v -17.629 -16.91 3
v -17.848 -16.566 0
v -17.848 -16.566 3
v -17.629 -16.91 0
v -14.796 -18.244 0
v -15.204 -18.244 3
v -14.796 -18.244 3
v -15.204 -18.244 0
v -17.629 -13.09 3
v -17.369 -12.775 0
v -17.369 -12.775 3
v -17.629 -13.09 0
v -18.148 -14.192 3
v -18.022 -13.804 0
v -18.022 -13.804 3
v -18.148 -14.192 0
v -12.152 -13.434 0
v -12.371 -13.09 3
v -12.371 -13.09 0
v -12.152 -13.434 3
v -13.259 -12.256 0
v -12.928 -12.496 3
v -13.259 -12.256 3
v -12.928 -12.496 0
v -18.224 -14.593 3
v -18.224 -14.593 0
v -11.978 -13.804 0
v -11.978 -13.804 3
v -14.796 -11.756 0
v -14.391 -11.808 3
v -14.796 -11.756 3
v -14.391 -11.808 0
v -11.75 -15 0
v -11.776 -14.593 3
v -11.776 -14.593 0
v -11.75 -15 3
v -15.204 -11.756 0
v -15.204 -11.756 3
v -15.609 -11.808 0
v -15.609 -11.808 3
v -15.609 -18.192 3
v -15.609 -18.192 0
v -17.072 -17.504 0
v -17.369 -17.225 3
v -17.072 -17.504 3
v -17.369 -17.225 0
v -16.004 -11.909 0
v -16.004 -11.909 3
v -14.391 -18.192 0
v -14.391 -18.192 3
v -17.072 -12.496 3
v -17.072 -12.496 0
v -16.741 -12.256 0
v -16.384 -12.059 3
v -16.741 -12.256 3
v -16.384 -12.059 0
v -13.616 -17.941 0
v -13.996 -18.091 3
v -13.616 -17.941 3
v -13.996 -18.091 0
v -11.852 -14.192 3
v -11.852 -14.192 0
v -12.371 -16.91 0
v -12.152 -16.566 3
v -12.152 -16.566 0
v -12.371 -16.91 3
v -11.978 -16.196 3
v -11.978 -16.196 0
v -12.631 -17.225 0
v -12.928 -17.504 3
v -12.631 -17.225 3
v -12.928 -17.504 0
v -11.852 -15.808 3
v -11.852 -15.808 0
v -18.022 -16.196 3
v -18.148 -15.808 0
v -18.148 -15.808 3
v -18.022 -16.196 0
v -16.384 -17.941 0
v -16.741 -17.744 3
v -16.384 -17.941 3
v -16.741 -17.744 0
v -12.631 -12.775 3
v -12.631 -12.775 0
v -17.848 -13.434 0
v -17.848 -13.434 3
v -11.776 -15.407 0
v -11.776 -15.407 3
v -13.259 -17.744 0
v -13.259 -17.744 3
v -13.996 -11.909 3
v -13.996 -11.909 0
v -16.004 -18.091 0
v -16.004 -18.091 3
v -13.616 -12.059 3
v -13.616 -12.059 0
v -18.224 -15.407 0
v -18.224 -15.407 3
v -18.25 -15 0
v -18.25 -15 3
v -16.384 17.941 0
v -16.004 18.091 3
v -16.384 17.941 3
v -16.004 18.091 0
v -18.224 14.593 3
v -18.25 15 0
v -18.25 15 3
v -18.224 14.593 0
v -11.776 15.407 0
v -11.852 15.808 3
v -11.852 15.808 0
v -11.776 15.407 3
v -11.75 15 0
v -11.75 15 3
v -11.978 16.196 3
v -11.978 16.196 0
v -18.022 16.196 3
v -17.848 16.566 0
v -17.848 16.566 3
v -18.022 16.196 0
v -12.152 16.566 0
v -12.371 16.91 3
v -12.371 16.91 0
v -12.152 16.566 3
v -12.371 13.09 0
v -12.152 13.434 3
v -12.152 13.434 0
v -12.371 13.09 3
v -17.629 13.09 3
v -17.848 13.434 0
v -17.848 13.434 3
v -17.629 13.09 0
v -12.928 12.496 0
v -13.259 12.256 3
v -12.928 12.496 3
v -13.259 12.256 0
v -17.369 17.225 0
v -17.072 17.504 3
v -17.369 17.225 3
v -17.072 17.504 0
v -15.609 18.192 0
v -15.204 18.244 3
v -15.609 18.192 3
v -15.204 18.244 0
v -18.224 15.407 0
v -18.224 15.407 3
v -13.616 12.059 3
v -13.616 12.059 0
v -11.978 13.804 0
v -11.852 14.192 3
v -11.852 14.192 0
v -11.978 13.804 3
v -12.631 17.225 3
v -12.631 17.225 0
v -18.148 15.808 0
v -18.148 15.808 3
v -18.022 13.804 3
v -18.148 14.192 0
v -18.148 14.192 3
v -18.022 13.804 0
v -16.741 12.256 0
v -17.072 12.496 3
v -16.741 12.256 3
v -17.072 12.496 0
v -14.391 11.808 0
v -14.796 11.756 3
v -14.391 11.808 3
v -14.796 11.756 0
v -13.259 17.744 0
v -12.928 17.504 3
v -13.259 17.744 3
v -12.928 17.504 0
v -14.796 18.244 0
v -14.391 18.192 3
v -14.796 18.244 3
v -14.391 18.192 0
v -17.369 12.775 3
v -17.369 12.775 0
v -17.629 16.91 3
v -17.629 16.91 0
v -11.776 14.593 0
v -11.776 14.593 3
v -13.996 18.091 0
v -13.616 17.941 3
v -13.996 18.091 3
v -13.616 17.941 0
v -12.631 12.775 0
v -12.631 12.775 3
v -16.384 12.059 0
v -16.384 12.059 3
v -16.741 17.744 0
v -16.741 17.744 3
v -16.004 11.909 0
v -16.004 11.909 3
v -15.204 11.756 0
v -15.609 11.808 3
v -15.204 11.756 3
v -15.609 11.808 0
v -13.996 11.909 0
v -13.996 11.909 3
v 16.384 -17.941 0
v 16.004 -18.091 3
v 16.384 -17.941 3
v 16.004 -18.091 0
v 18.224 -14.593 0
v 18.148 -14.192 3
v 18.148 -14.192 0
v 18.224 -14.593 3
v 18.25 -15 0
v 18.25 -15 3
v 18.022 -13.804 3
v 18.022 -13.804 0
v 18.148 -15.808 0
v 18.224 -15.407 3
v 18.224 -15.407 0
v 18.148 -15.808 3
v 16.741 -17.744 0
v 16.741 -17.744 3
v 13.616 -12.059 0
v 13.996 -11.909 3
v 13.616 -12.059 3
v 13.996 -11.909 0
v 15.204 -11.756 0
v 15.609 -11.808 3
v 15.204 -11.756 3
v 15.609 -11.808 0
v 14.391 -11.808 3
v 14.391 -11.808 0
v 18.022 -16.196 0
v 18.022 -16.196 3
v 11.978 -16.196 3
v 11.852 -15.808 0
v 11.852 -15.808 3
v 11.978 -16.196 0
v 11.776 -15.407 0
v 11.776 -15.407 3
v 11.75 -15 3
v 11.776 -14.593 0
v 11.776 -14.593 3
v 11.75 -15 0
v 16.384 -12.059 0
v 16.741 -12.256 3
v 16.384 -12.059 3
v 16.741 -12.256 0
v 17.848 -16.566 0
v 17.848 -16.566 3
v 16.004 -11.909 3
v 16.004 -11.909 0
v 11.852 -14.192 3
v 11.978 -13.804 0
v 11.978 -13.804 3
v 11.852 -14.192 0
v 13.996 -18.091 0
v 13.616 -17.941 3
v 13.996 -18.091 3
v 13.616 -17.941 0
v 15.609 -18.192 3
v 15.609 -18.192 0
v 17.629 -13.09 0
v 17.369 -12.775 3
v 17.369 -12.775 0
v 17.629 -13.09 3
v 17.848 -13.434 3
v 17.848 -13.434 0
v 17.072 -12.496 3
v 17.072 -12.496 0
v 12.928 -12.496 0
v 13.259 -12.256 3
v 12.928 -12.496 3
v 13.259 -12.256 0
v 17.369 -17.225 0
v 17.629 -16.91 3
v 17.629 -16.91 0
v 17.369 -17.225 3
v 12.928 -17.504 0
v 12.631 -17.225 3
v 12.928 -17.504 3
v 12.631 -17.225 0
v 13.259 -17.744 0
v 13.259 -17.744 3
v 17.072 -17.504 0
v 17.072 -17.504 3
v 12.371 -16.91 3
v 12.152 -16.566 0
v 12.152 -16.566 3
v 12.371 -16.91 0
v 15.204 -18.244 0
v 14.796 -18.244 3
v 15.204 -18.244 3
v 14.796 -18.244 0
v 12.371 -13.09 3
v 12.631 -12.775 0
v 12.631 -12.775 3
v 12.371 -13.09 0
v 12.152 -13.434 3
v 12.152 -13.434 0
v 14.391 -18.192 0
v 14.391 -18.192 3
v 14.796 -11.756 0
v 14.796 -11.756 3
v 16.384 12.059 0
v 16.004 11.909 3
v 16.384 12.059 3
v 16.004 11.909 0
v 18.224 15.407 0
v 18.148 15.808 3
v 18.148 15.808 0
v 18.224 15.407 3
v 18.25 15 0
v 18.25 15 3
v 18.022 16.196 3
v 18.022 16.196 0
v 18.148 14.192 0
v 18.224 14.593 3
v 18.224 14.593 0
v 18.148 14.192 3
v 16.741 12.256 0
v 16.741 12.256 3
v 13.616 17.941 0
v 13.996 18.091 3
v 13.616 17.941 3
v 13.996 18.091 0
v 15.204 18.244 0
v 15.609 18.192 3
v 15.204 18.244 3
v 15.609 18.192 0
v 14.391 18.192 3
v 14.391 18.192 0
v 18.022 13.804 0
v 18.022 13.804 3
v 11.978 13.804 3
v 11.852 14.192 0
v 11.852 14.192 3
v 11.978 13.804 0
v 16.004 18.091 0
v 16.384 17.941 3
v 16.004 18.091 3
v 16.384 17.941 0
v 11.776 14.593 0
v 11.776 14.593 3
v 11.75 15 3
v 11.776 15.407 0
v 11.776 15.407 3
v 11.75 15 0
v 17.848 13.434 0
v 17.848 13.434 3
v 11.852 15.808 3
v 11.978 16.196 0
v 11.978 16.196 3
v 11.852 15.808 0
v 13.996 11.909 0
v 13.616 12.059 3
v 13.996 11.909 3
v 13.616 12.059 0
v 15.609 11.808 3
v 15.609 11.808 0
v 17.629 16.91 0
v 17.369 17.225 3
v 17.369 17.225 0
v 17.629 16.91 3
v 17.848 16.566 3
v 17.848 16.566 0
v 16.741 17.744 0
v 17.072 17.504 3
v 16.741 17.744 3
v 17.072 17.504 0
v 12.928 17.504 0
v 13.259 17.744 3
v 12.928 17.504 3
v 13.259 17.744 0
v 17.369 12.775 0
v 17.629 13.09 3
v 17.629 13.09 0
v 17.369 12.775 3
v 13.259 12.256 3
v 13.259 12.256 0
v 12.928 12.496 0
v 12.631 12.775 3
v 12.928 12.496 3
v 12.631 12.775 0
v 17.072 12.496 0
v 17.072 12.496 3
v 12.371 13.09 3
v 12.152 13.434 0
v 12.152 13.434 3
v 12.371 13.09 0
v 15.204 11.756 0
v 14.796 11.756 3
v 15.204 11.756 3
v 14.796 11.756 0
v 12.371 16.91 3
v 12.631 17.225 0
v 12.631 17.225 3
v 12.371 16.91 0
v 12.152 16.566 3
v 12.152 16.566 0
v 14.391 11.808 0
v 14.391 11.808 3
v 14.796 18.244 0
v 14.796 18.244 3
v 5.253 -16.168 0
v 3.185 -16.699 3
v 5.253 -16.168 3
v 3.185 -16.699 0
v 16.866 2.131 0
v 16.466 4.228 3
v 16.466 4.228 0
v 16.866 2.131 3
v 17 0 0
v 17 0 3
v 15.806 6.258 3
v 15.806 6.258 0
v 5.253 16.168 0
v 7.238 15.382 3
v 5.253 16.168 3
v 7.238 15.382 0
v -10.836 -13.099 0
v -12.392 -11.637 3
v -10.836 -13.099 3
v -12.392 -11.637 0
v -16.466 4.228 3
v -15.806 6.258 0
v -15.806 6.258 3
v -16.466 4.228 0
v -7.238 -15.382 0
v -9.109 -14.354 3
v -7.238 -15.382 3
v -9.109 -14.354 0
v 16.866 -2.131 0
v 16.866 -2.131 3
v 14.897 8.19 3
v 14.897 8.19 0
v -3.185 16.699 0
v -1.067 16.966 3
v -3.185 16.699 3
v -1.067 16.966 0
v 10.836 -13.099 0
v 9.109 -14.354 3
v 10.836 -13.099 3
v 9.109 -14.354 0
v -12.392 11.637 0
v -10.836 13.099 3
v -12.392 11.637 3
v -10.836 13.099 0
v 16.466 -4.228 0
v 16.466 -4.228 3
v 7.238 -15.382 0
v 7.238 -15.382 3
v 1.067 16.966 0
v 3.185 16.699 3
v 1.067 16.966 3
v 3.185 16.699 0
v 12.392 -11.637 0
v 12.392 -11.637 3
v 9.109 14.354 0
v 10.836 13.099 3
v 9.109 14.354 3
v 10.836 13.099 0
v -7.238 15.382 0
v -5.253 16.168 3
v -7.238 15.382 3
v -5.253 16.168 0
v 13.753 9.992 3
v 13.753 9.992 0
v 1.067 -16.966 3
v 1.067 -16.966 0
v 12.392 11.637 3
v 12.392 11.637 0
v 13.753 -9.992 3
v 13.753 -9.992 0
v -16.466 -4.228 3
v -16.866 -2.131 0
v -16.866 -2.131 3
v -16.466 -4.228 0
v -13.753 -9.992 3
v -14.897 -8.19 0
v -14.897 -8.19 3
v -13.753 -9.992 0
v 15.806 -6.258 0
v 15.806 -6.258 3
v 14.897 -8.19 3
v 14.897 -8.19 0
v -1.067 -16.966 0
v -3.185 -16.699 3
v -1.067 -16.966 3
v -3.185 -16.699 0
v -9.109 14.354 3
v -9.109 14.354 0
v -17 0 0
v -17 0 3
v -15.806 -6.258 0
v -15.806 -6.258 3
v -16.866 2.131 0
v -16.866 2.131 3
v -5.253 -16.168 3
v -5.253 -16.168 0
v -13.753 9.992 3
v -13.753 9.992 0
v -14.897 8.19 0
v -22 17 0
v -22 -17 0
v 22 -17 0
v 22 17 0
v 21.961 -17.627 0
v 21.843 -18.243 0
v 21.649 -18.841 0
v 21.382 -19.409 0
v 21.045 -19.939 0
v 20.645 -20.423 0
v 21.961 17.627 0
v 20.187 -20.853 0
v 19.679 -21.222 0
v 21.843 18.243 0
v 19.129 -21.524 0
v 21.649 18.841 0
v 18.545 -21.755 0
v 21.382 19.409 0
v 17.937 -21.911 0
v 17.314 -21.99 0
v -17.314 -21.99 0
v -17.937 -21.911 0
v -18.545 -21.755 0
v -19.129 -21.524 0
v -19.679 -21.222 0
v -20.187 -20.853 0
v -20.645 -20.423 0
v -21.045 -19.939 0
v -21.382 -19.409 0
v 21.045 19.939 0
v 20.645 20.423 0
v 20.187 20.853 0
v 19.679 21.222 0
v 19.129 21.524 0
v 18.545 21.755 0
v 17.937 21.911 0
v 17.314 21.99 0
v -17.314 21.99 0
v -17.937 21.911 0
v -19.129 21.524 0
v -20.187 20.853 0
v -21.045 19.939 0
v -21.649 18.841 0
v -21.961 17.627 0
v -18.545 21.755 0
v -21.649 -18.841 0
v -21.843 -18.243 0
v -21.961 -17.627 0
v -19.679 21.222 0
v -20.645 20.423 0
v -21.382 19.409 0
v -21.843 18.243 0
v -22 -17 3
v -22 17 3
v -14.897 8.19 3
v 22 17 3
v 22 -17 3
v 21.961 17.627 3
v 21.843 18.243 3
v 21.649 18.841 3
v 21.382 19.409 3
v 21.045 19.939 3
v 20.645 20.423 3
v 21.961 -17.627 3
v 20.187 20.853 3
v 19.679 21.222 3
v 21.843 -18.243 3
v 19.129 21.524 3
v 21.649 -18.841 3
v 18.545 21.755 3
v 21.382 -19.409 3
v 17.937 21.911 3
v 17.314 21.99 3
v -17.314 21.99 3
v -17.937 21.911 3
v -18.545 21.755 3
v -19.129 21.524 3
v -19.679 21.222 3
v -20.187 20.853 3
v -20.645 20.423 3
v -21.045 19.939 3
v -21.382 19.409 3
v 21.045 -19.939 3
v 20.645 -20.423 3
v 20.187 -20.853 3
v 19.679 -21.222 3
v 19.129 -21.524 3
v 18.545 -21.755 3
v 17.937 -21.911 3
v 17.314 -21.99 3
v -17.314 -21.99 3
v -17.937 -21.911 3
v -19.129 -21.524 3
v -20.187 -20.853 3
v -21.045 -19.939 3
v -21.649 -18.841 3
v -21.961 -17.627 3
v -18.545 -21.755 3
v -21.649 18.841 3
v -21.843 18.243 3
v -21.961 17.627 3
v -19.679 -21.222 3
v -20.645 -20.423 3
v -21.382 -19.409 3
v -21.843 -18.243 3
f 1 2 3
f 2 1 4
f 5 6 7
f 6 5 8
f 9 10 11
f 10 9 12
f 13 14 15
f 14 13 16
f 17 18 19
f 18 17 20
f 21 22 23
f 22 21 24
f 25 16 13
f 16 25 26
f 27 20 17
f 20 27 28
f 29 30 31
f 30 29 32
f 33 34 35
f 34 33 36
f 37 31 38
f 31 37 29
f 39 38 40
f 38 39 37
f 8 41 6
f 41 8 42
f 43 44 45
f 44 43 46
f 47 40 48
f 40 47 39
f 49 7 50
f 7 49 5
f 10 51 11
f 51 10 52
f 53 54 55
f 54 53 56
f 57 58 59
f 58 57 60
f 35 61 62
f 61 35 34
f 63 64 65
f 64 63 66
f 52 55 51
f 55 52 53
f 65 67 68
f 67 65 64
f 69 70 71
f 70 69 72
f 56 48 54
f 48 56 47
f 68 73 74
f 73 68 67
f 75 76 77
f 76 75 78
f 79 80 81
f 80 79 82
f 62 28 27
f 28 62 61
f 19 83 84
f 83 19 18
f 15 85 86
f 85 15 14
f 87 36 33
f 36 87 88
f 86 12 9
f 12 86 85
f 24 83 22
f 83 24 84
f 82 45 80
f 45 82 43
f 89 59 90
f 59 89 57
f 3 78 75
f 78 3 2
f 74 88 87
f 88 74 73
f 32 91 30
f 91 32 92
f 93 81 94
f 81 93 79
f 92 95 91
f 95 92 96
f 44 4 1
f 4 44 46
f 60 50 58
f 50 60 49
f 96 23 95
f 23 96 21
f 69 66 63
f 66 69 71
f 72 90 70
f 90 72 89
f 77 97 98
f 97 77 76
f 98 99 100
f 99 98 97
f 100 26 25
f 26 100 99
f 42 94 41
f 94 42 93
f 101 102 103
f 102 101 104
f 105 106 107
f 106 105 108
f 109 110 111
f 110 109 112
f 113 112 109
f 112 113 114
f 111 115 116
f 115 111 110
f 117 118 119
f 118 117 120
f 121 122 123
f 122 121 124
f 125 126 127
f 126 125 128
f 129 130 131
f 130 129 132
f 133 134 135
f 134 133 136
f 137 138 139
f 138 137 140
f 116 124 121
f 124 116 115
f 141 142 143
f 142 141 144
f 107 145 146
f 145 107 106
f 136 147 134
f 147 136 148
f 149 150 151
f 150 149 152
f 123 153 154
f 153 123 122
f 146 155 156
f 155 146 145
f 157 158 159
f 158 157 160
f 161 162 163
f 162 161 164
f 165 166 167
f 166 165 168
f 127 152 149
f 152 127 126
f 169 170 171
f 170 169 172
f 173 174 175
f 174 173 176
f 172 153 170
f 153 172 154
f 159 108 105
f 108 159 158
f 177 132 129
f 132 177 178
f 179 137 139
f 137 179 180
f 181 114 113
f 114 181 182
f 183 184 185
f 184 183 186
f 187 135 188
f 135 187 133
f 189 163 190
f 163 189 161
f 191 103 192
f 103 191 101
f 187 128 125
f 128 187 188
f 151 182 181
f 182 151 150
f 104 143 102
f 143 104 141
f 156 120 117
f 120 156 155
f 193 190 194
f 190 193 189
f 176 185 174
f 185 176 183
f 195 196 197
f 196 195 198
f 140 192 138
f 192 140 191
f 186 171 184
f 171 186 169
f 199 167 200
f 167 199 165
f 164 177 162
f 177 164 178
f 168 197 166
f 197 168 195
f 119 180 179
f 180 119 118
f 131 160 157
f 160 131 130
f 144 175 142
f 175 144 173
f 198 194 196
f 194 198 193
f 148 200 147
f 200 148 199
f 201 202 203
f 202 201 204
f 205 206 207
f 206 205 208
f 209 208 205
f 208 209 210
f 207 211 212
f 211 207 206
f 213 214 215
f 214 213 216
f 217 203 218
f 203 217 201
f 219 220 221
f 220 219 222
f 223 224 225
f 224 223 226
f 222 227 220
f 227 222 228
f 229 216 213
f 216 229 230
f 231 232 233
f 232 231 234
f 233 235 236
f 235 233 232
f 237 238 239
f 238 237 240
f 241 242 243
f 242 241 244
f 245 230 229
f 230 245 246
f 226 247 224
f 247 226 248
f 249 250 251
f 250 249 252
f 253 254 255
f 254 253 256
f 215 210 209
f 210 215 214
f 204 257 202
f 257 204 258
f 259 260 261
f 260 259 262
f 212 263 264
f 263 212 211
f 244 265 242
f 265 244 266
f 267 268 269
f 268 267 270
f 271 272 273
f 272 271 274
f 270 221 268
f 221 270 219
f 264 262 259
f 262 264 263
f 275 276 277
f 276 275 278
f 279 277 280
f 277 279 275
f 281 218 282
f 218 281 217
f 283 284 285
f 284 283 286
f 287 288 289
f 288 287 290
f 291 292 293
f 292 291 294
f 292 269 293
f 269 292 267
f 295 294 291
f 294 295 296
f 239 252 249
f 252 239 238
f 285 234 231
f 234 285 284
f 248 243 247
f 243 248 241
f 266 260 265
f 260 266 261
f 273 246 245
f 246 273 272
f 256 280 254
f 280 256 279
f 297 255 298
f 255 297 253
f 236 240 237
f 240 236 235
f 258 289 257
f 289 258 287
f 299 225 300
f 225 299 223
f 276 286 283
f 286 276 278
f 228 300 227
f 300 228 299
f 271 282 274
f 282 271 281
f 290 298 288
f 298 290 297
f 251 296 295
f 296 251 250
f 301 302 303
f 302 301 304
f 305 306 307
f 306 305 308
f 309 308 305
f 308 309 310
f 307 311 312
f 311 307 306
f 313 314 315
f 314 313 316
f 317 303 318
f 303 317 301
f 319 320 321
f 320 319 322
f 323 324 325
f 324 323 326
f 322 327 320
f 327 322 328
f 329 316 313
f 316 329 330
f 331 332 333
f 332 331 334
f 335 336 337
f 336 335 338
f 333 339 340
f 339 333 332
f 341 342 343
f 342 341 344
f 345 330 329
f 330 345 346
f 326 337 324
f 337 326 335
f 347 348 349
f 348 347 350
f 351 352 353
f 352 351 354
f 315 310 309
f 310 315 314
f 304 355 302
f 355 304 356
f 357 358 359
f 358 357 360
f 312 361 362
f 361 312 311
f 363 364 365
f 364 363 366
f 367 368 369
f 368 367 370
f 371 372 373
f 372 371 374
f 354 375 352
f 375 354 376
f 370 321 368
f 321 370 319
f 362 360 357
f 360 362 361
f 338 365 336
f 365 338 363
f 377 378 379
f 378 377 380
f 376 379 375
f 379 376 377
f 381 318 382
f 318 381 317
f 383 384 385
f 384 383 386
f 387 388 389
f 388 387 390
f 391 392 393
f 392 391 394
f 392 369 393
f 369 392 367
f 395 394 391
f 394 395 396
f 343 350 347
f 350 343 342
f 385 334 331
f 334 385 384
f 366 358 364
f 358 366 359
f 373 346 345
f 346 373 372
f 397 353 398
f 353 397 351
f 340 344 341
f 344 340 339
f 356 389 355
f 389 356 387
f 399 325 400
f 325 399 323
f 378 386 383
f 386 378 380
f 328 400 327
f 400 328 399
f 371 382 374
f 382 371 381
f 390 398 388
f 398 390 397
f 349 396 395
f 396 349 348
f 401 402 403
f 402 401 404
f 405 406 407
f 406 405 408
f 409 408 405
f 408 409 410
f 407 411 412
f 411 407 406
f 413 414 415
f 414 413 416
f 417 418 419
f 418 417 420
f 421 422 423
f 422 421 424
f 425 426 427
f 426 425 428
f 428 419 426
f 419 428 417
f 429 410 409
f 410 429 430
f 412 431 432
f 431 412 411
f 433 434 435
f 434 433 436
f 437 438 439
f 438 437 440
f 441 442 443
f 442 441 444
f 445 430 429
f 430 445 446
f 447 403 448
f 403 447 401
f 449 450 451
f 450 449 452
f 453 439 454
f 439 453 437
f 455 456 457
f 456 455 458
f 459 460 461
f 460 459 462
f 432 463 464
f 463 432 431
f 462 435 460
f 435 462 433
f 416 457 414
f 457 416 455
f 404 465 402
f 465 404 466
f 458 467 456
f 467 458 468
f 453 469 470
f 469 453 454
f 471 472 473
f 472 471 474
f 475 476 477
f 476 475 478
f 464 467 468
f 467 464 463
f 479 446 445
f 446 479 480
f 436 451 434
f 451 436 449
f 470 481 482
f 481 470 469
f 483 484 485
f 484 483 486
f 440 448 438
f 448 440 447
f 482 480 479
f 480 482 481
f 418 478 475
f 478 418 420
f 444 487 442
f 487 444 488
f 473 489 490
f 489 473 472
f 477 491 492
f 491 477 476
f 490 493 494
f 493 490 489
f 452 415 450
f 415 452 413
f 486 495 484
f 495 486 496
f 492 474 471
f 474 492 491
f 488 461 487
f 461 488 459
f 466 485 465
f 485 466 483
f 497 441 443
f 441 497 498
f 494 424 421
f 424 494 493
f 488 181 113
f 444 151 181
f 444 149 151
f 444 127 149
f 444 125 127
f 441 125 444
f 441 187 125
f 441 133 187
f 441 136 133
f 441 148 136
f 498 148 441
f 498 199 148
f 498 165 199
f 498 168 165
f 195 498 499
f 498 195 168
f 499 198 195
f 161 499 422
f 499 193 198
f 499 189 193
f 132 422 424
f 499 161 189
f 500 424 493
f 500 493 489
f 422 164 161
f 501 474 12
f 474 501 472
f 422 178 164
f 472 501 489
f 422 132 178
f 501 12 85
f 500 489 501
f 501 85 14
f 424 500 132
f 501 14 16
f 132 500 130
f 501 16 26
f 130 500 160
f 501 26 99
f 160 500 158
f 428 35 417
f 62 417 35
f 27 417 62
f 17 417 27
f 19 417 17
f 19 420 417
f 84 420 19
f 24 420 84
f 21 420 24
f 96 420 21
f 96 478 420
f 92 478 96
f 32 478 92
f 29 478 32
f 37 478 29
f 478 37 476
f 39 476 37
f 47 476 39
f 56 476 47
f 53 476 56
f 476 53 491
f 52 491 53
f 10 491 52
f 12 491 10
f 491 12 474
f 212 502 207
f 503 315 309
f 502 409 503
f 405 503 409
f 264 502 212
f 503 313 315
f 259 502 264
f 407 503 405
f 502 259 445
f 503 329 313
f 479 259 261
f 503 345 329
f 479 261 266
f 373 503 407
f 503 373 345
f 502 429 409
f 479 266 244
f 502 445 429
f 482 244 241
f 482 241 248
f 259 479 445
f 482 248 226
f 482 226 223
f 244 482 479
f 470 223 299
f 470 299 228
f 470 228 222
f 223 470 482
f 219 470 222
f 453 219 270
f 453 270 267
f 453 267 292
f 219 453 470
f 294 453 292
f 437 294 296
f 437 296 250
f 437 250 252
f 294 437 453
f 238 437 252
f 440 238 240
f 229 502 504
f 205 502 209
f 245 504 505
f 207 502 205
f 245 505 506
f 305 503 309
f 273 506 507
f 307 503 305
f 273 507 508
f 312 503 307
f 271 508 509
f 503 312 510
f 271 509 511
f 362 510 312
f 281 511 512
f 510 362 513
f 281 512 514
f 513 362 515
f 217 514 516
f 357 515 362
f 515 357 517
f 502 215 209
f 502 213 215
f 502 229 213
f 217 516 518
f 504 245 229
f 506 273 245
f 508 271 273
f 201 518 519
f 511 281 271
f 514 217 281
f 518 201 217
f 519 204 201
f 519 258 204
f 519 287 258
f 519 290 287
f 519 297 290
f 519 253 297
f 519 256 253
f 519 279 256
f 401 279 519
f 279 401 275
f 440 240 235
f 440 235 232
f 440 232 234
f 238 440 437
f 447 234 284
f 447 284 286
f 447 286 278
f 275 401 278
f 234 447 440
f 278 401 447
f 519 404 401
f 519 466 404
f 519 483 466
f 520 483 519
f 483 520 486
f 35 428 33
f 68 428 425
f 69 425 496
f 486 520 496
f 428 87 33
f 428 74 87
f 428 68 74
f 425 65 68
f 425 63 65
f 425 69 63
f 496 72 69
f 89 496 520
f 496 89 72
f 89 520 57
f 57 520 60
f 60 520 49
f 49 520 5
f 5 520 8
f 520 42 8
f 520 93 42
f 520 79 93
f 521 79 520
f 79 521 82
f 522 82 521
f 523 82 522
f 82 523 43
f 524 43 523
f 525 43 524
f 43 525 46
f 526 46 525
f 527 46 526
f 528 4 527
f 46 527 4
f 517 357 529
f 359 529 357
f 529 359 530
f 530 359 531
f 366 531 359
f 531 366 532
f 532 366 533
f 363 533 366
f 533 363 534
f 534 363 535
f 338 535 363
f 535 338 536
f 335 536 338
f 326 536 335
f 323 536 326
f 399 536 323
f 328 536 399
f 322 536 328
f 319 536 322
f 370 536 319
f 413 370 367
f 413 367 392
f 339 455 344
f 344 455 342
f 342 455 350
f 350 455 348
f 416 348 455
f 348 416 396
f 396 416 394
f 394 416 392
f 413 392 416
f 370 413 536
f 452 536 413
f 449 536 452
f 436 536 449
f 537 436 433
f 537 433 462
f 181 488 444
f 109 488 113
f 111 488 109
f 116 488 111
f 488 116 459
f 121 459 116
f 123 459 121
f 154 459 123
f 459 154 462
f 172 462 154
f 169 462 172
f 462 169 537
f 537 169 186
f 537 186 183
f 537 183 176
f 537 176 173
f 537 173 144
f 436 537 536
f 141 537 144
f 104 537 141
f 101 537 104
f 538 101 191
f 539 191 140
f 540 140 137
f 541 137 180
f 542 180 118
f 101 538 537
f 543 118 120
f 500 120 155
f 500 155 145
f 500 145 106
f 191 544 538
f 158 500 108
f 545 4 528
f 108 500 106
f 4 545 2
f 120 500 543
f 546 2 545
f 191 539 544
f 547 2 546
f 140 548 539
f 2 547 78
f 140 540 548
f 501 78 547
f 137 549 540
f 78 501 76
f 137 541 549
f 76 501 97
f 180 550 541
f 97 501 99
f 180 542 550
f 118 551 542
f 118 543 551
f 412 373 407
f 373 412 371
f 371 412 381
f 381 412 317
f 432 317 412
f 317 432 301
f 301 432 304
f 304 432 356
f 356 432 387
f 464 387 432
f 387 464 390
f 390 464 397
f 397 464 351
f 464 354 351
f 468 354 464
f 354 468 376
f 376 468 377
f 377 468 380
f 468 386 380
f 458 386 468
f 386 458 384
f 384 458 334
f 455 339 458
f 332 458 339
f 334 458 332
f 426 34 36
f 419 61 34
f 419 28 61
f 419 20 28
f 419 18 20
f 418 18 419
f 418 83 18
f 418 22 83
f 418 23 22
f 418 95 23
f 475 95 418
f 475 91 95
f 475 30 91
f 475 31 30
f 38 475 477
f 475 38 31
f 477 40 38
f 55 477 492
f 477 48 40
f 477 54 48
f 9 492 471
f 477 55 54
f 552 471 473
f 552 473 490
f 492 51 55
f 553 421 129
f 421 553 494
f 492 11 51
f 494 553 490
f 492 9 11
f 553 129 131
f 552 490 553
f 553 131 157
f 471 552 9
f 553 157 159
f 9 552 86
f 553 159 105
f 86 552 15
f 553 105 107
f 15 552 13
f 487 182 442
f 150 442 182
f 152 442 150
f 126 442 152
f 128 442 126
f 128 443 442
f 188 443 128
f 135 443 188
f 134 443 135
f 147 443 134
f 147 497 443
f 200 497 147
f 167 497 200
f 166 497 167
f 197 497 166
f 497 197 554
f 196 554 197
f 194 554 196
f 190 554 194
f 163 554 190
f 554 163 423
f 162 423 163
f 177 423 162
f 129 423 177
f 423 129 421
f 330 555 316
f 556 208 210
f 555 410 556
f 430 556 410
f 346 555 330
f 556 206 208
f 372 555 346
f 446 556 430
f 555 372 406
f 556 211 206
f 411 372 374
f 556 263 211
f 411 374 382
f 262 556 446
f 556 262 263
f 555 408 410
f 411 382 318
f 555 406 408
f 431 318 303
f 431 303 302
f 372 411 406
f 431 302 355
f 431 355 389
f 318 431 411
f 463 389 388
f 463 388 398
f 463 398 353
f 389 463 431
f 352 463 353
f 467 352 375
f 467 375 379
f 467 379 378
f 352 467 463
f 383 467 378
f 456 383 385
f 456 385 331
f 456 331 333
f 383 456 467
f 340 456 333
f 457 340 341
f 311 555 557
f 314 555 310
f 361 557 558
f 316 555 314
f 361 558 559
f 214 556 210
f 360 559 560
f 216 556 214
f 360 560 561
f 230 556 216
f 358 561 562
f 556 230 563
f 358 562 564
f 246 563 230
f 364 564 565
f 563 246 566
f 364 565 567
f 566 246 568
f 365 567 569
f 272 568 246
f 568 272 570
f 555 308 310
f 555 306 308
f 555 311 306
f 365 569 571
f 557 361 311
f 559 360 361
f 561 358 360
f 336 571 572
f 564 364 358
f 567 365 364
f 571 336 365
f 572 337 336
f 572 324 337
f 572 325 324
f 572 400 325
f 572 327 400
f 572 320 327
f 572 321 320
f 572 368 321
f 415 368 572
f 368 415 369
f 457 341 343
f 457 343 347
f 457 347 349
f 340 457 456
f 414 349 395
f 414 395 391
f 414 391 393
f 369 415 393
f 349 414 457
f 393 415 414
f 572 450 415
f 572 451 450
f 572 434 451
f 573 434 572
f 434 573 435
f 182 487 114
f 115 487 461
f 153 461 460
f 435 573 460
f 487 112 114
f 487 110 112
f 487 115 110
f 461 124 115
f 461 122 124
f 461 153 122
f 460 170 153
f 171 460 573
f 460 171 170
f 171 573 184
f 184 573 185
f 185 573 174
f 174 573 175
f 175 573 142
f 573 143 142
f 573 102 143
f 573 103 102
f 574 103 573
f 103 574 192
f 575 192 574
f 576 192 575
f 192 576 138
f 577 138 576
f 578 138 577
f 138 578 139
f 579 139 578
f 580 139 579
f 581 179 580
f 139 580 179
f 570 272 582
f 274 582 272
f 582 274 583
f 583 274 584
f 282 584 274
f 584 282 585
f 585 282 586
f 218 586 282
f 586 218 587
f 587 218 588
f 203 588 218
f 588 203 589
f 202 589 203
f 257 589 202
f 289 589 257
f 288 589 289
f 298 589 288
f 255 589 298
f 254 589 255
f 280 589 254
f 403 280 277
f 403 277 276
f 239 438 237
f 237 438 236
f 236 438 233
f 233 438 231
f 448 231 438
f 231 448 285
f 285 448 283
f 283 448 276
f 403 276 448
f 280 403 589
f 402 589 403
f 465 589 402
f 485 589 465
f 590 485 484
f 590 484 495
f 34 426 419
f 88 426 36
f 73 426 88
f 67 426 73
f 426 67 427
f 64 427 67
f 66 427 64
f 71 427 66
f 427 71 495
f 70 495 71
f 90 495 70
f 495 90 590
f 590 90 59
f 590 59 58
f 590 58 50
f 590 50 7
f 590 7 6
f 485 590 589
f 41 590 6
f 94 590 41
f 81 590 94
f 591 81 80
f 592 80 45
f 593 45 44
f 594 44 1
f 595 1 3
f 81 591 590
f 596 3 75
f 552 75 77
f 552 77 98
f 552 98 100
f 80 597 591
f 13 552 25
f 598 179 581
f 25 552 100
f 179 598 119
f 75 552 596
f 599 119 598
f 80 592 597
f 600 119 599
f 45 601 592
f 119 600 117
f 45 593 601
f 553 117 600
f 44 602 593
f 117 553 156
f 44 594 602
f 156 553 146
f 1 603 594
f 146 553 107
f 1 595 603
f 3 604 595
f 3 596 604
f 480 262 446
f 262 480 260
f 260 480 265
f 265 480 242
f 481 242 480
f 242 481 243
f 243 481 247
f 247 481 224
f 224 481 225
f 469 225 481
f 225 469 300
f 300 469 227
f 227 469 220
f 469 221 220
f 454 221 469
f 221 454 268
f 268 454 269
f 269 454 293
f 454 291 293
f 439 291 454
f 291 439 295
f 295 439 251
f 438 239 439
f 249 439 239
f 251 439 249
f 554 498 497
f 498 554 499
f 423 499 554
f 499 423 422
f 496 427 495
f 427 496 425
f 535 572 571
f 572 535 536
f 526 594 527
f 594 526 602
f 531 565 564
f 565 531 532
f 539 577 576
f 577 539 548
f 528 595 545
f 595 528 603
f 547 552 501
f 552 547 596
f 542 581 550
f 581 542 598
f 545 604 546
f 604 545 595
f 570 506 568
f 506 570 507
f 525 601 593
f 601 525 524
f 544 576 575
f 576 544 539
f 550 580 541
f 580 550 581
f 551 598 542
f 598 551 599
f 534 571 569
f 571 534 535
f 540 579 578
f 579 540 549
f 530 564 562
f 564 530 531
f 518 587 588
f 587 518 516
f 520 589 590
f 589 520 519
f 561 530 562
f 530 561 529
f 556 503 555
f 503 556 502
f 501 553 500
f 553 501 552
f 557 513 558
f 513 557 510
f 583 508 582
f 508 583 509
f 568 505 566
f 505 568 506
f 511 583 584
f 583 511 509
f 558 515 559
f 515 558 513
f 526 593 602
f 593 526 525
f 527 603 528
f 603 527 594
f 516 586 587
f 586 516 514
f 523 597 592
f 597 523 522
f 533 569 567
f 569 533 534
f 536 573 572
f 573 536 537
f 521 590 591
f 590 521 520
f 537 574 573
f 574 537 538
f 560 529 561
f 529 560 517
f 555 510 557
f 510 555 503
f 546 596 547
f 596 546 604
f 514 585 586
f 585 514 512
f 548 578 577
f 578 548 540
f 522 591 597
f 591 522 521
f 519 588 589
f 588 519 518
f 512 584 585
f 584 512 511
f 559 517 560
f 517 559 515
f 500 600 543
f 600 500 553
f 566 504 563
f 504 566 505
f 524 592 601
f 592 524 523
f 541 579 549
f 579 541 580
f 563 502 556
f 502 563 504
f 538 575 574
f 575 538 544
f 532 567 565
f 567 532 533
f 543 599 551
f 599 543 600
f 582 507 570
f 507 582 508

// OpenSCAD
$fn = 50;


difference() {
	union() {
		hull() {
			translate(v = [-17.0000000000, 17.0000000000, 0]) {
				cylinder(h = 3, r = 5);
			}
			translate(v = [17.0000000000, 17.0000000000, 0]) {
				cylinder(h = 3, r = 5);
			}
			translate(v = [-17.0000000000, -17.0000000000, 0]) {
				cylinder(h = 3, r = 5);
			}
			translate(v = [17.0000000000, -17.0000000000, 0]) {
				cylinder(h = 3, r = 5);
			}
		}
	}
	union() {
		#translate(v = [-15.0000000000, -15.0000000000, -100.0000000000]) {
			cylinder(h = 200, r = 3.2500000000);
		}
		#translate(v = [-15.0000000000, 15.0000000000, -100.0000000000]) {
			cylinder(h = 200, r = 3.2500000000);
		}
		#translate(v = [15.0000000000, -15.0000000000, -100.0000000000]) {
			cylinder(h = 200, r = 3.2500000000);
		}
		#translate(v = [15.0000000000, 15.0000000000, -100.0000000000]) {
			cylinder(h = 200, r = 3.2500000000);
		}
		#cylinder(h = 3, r = 17.0000000000);
	}
}
